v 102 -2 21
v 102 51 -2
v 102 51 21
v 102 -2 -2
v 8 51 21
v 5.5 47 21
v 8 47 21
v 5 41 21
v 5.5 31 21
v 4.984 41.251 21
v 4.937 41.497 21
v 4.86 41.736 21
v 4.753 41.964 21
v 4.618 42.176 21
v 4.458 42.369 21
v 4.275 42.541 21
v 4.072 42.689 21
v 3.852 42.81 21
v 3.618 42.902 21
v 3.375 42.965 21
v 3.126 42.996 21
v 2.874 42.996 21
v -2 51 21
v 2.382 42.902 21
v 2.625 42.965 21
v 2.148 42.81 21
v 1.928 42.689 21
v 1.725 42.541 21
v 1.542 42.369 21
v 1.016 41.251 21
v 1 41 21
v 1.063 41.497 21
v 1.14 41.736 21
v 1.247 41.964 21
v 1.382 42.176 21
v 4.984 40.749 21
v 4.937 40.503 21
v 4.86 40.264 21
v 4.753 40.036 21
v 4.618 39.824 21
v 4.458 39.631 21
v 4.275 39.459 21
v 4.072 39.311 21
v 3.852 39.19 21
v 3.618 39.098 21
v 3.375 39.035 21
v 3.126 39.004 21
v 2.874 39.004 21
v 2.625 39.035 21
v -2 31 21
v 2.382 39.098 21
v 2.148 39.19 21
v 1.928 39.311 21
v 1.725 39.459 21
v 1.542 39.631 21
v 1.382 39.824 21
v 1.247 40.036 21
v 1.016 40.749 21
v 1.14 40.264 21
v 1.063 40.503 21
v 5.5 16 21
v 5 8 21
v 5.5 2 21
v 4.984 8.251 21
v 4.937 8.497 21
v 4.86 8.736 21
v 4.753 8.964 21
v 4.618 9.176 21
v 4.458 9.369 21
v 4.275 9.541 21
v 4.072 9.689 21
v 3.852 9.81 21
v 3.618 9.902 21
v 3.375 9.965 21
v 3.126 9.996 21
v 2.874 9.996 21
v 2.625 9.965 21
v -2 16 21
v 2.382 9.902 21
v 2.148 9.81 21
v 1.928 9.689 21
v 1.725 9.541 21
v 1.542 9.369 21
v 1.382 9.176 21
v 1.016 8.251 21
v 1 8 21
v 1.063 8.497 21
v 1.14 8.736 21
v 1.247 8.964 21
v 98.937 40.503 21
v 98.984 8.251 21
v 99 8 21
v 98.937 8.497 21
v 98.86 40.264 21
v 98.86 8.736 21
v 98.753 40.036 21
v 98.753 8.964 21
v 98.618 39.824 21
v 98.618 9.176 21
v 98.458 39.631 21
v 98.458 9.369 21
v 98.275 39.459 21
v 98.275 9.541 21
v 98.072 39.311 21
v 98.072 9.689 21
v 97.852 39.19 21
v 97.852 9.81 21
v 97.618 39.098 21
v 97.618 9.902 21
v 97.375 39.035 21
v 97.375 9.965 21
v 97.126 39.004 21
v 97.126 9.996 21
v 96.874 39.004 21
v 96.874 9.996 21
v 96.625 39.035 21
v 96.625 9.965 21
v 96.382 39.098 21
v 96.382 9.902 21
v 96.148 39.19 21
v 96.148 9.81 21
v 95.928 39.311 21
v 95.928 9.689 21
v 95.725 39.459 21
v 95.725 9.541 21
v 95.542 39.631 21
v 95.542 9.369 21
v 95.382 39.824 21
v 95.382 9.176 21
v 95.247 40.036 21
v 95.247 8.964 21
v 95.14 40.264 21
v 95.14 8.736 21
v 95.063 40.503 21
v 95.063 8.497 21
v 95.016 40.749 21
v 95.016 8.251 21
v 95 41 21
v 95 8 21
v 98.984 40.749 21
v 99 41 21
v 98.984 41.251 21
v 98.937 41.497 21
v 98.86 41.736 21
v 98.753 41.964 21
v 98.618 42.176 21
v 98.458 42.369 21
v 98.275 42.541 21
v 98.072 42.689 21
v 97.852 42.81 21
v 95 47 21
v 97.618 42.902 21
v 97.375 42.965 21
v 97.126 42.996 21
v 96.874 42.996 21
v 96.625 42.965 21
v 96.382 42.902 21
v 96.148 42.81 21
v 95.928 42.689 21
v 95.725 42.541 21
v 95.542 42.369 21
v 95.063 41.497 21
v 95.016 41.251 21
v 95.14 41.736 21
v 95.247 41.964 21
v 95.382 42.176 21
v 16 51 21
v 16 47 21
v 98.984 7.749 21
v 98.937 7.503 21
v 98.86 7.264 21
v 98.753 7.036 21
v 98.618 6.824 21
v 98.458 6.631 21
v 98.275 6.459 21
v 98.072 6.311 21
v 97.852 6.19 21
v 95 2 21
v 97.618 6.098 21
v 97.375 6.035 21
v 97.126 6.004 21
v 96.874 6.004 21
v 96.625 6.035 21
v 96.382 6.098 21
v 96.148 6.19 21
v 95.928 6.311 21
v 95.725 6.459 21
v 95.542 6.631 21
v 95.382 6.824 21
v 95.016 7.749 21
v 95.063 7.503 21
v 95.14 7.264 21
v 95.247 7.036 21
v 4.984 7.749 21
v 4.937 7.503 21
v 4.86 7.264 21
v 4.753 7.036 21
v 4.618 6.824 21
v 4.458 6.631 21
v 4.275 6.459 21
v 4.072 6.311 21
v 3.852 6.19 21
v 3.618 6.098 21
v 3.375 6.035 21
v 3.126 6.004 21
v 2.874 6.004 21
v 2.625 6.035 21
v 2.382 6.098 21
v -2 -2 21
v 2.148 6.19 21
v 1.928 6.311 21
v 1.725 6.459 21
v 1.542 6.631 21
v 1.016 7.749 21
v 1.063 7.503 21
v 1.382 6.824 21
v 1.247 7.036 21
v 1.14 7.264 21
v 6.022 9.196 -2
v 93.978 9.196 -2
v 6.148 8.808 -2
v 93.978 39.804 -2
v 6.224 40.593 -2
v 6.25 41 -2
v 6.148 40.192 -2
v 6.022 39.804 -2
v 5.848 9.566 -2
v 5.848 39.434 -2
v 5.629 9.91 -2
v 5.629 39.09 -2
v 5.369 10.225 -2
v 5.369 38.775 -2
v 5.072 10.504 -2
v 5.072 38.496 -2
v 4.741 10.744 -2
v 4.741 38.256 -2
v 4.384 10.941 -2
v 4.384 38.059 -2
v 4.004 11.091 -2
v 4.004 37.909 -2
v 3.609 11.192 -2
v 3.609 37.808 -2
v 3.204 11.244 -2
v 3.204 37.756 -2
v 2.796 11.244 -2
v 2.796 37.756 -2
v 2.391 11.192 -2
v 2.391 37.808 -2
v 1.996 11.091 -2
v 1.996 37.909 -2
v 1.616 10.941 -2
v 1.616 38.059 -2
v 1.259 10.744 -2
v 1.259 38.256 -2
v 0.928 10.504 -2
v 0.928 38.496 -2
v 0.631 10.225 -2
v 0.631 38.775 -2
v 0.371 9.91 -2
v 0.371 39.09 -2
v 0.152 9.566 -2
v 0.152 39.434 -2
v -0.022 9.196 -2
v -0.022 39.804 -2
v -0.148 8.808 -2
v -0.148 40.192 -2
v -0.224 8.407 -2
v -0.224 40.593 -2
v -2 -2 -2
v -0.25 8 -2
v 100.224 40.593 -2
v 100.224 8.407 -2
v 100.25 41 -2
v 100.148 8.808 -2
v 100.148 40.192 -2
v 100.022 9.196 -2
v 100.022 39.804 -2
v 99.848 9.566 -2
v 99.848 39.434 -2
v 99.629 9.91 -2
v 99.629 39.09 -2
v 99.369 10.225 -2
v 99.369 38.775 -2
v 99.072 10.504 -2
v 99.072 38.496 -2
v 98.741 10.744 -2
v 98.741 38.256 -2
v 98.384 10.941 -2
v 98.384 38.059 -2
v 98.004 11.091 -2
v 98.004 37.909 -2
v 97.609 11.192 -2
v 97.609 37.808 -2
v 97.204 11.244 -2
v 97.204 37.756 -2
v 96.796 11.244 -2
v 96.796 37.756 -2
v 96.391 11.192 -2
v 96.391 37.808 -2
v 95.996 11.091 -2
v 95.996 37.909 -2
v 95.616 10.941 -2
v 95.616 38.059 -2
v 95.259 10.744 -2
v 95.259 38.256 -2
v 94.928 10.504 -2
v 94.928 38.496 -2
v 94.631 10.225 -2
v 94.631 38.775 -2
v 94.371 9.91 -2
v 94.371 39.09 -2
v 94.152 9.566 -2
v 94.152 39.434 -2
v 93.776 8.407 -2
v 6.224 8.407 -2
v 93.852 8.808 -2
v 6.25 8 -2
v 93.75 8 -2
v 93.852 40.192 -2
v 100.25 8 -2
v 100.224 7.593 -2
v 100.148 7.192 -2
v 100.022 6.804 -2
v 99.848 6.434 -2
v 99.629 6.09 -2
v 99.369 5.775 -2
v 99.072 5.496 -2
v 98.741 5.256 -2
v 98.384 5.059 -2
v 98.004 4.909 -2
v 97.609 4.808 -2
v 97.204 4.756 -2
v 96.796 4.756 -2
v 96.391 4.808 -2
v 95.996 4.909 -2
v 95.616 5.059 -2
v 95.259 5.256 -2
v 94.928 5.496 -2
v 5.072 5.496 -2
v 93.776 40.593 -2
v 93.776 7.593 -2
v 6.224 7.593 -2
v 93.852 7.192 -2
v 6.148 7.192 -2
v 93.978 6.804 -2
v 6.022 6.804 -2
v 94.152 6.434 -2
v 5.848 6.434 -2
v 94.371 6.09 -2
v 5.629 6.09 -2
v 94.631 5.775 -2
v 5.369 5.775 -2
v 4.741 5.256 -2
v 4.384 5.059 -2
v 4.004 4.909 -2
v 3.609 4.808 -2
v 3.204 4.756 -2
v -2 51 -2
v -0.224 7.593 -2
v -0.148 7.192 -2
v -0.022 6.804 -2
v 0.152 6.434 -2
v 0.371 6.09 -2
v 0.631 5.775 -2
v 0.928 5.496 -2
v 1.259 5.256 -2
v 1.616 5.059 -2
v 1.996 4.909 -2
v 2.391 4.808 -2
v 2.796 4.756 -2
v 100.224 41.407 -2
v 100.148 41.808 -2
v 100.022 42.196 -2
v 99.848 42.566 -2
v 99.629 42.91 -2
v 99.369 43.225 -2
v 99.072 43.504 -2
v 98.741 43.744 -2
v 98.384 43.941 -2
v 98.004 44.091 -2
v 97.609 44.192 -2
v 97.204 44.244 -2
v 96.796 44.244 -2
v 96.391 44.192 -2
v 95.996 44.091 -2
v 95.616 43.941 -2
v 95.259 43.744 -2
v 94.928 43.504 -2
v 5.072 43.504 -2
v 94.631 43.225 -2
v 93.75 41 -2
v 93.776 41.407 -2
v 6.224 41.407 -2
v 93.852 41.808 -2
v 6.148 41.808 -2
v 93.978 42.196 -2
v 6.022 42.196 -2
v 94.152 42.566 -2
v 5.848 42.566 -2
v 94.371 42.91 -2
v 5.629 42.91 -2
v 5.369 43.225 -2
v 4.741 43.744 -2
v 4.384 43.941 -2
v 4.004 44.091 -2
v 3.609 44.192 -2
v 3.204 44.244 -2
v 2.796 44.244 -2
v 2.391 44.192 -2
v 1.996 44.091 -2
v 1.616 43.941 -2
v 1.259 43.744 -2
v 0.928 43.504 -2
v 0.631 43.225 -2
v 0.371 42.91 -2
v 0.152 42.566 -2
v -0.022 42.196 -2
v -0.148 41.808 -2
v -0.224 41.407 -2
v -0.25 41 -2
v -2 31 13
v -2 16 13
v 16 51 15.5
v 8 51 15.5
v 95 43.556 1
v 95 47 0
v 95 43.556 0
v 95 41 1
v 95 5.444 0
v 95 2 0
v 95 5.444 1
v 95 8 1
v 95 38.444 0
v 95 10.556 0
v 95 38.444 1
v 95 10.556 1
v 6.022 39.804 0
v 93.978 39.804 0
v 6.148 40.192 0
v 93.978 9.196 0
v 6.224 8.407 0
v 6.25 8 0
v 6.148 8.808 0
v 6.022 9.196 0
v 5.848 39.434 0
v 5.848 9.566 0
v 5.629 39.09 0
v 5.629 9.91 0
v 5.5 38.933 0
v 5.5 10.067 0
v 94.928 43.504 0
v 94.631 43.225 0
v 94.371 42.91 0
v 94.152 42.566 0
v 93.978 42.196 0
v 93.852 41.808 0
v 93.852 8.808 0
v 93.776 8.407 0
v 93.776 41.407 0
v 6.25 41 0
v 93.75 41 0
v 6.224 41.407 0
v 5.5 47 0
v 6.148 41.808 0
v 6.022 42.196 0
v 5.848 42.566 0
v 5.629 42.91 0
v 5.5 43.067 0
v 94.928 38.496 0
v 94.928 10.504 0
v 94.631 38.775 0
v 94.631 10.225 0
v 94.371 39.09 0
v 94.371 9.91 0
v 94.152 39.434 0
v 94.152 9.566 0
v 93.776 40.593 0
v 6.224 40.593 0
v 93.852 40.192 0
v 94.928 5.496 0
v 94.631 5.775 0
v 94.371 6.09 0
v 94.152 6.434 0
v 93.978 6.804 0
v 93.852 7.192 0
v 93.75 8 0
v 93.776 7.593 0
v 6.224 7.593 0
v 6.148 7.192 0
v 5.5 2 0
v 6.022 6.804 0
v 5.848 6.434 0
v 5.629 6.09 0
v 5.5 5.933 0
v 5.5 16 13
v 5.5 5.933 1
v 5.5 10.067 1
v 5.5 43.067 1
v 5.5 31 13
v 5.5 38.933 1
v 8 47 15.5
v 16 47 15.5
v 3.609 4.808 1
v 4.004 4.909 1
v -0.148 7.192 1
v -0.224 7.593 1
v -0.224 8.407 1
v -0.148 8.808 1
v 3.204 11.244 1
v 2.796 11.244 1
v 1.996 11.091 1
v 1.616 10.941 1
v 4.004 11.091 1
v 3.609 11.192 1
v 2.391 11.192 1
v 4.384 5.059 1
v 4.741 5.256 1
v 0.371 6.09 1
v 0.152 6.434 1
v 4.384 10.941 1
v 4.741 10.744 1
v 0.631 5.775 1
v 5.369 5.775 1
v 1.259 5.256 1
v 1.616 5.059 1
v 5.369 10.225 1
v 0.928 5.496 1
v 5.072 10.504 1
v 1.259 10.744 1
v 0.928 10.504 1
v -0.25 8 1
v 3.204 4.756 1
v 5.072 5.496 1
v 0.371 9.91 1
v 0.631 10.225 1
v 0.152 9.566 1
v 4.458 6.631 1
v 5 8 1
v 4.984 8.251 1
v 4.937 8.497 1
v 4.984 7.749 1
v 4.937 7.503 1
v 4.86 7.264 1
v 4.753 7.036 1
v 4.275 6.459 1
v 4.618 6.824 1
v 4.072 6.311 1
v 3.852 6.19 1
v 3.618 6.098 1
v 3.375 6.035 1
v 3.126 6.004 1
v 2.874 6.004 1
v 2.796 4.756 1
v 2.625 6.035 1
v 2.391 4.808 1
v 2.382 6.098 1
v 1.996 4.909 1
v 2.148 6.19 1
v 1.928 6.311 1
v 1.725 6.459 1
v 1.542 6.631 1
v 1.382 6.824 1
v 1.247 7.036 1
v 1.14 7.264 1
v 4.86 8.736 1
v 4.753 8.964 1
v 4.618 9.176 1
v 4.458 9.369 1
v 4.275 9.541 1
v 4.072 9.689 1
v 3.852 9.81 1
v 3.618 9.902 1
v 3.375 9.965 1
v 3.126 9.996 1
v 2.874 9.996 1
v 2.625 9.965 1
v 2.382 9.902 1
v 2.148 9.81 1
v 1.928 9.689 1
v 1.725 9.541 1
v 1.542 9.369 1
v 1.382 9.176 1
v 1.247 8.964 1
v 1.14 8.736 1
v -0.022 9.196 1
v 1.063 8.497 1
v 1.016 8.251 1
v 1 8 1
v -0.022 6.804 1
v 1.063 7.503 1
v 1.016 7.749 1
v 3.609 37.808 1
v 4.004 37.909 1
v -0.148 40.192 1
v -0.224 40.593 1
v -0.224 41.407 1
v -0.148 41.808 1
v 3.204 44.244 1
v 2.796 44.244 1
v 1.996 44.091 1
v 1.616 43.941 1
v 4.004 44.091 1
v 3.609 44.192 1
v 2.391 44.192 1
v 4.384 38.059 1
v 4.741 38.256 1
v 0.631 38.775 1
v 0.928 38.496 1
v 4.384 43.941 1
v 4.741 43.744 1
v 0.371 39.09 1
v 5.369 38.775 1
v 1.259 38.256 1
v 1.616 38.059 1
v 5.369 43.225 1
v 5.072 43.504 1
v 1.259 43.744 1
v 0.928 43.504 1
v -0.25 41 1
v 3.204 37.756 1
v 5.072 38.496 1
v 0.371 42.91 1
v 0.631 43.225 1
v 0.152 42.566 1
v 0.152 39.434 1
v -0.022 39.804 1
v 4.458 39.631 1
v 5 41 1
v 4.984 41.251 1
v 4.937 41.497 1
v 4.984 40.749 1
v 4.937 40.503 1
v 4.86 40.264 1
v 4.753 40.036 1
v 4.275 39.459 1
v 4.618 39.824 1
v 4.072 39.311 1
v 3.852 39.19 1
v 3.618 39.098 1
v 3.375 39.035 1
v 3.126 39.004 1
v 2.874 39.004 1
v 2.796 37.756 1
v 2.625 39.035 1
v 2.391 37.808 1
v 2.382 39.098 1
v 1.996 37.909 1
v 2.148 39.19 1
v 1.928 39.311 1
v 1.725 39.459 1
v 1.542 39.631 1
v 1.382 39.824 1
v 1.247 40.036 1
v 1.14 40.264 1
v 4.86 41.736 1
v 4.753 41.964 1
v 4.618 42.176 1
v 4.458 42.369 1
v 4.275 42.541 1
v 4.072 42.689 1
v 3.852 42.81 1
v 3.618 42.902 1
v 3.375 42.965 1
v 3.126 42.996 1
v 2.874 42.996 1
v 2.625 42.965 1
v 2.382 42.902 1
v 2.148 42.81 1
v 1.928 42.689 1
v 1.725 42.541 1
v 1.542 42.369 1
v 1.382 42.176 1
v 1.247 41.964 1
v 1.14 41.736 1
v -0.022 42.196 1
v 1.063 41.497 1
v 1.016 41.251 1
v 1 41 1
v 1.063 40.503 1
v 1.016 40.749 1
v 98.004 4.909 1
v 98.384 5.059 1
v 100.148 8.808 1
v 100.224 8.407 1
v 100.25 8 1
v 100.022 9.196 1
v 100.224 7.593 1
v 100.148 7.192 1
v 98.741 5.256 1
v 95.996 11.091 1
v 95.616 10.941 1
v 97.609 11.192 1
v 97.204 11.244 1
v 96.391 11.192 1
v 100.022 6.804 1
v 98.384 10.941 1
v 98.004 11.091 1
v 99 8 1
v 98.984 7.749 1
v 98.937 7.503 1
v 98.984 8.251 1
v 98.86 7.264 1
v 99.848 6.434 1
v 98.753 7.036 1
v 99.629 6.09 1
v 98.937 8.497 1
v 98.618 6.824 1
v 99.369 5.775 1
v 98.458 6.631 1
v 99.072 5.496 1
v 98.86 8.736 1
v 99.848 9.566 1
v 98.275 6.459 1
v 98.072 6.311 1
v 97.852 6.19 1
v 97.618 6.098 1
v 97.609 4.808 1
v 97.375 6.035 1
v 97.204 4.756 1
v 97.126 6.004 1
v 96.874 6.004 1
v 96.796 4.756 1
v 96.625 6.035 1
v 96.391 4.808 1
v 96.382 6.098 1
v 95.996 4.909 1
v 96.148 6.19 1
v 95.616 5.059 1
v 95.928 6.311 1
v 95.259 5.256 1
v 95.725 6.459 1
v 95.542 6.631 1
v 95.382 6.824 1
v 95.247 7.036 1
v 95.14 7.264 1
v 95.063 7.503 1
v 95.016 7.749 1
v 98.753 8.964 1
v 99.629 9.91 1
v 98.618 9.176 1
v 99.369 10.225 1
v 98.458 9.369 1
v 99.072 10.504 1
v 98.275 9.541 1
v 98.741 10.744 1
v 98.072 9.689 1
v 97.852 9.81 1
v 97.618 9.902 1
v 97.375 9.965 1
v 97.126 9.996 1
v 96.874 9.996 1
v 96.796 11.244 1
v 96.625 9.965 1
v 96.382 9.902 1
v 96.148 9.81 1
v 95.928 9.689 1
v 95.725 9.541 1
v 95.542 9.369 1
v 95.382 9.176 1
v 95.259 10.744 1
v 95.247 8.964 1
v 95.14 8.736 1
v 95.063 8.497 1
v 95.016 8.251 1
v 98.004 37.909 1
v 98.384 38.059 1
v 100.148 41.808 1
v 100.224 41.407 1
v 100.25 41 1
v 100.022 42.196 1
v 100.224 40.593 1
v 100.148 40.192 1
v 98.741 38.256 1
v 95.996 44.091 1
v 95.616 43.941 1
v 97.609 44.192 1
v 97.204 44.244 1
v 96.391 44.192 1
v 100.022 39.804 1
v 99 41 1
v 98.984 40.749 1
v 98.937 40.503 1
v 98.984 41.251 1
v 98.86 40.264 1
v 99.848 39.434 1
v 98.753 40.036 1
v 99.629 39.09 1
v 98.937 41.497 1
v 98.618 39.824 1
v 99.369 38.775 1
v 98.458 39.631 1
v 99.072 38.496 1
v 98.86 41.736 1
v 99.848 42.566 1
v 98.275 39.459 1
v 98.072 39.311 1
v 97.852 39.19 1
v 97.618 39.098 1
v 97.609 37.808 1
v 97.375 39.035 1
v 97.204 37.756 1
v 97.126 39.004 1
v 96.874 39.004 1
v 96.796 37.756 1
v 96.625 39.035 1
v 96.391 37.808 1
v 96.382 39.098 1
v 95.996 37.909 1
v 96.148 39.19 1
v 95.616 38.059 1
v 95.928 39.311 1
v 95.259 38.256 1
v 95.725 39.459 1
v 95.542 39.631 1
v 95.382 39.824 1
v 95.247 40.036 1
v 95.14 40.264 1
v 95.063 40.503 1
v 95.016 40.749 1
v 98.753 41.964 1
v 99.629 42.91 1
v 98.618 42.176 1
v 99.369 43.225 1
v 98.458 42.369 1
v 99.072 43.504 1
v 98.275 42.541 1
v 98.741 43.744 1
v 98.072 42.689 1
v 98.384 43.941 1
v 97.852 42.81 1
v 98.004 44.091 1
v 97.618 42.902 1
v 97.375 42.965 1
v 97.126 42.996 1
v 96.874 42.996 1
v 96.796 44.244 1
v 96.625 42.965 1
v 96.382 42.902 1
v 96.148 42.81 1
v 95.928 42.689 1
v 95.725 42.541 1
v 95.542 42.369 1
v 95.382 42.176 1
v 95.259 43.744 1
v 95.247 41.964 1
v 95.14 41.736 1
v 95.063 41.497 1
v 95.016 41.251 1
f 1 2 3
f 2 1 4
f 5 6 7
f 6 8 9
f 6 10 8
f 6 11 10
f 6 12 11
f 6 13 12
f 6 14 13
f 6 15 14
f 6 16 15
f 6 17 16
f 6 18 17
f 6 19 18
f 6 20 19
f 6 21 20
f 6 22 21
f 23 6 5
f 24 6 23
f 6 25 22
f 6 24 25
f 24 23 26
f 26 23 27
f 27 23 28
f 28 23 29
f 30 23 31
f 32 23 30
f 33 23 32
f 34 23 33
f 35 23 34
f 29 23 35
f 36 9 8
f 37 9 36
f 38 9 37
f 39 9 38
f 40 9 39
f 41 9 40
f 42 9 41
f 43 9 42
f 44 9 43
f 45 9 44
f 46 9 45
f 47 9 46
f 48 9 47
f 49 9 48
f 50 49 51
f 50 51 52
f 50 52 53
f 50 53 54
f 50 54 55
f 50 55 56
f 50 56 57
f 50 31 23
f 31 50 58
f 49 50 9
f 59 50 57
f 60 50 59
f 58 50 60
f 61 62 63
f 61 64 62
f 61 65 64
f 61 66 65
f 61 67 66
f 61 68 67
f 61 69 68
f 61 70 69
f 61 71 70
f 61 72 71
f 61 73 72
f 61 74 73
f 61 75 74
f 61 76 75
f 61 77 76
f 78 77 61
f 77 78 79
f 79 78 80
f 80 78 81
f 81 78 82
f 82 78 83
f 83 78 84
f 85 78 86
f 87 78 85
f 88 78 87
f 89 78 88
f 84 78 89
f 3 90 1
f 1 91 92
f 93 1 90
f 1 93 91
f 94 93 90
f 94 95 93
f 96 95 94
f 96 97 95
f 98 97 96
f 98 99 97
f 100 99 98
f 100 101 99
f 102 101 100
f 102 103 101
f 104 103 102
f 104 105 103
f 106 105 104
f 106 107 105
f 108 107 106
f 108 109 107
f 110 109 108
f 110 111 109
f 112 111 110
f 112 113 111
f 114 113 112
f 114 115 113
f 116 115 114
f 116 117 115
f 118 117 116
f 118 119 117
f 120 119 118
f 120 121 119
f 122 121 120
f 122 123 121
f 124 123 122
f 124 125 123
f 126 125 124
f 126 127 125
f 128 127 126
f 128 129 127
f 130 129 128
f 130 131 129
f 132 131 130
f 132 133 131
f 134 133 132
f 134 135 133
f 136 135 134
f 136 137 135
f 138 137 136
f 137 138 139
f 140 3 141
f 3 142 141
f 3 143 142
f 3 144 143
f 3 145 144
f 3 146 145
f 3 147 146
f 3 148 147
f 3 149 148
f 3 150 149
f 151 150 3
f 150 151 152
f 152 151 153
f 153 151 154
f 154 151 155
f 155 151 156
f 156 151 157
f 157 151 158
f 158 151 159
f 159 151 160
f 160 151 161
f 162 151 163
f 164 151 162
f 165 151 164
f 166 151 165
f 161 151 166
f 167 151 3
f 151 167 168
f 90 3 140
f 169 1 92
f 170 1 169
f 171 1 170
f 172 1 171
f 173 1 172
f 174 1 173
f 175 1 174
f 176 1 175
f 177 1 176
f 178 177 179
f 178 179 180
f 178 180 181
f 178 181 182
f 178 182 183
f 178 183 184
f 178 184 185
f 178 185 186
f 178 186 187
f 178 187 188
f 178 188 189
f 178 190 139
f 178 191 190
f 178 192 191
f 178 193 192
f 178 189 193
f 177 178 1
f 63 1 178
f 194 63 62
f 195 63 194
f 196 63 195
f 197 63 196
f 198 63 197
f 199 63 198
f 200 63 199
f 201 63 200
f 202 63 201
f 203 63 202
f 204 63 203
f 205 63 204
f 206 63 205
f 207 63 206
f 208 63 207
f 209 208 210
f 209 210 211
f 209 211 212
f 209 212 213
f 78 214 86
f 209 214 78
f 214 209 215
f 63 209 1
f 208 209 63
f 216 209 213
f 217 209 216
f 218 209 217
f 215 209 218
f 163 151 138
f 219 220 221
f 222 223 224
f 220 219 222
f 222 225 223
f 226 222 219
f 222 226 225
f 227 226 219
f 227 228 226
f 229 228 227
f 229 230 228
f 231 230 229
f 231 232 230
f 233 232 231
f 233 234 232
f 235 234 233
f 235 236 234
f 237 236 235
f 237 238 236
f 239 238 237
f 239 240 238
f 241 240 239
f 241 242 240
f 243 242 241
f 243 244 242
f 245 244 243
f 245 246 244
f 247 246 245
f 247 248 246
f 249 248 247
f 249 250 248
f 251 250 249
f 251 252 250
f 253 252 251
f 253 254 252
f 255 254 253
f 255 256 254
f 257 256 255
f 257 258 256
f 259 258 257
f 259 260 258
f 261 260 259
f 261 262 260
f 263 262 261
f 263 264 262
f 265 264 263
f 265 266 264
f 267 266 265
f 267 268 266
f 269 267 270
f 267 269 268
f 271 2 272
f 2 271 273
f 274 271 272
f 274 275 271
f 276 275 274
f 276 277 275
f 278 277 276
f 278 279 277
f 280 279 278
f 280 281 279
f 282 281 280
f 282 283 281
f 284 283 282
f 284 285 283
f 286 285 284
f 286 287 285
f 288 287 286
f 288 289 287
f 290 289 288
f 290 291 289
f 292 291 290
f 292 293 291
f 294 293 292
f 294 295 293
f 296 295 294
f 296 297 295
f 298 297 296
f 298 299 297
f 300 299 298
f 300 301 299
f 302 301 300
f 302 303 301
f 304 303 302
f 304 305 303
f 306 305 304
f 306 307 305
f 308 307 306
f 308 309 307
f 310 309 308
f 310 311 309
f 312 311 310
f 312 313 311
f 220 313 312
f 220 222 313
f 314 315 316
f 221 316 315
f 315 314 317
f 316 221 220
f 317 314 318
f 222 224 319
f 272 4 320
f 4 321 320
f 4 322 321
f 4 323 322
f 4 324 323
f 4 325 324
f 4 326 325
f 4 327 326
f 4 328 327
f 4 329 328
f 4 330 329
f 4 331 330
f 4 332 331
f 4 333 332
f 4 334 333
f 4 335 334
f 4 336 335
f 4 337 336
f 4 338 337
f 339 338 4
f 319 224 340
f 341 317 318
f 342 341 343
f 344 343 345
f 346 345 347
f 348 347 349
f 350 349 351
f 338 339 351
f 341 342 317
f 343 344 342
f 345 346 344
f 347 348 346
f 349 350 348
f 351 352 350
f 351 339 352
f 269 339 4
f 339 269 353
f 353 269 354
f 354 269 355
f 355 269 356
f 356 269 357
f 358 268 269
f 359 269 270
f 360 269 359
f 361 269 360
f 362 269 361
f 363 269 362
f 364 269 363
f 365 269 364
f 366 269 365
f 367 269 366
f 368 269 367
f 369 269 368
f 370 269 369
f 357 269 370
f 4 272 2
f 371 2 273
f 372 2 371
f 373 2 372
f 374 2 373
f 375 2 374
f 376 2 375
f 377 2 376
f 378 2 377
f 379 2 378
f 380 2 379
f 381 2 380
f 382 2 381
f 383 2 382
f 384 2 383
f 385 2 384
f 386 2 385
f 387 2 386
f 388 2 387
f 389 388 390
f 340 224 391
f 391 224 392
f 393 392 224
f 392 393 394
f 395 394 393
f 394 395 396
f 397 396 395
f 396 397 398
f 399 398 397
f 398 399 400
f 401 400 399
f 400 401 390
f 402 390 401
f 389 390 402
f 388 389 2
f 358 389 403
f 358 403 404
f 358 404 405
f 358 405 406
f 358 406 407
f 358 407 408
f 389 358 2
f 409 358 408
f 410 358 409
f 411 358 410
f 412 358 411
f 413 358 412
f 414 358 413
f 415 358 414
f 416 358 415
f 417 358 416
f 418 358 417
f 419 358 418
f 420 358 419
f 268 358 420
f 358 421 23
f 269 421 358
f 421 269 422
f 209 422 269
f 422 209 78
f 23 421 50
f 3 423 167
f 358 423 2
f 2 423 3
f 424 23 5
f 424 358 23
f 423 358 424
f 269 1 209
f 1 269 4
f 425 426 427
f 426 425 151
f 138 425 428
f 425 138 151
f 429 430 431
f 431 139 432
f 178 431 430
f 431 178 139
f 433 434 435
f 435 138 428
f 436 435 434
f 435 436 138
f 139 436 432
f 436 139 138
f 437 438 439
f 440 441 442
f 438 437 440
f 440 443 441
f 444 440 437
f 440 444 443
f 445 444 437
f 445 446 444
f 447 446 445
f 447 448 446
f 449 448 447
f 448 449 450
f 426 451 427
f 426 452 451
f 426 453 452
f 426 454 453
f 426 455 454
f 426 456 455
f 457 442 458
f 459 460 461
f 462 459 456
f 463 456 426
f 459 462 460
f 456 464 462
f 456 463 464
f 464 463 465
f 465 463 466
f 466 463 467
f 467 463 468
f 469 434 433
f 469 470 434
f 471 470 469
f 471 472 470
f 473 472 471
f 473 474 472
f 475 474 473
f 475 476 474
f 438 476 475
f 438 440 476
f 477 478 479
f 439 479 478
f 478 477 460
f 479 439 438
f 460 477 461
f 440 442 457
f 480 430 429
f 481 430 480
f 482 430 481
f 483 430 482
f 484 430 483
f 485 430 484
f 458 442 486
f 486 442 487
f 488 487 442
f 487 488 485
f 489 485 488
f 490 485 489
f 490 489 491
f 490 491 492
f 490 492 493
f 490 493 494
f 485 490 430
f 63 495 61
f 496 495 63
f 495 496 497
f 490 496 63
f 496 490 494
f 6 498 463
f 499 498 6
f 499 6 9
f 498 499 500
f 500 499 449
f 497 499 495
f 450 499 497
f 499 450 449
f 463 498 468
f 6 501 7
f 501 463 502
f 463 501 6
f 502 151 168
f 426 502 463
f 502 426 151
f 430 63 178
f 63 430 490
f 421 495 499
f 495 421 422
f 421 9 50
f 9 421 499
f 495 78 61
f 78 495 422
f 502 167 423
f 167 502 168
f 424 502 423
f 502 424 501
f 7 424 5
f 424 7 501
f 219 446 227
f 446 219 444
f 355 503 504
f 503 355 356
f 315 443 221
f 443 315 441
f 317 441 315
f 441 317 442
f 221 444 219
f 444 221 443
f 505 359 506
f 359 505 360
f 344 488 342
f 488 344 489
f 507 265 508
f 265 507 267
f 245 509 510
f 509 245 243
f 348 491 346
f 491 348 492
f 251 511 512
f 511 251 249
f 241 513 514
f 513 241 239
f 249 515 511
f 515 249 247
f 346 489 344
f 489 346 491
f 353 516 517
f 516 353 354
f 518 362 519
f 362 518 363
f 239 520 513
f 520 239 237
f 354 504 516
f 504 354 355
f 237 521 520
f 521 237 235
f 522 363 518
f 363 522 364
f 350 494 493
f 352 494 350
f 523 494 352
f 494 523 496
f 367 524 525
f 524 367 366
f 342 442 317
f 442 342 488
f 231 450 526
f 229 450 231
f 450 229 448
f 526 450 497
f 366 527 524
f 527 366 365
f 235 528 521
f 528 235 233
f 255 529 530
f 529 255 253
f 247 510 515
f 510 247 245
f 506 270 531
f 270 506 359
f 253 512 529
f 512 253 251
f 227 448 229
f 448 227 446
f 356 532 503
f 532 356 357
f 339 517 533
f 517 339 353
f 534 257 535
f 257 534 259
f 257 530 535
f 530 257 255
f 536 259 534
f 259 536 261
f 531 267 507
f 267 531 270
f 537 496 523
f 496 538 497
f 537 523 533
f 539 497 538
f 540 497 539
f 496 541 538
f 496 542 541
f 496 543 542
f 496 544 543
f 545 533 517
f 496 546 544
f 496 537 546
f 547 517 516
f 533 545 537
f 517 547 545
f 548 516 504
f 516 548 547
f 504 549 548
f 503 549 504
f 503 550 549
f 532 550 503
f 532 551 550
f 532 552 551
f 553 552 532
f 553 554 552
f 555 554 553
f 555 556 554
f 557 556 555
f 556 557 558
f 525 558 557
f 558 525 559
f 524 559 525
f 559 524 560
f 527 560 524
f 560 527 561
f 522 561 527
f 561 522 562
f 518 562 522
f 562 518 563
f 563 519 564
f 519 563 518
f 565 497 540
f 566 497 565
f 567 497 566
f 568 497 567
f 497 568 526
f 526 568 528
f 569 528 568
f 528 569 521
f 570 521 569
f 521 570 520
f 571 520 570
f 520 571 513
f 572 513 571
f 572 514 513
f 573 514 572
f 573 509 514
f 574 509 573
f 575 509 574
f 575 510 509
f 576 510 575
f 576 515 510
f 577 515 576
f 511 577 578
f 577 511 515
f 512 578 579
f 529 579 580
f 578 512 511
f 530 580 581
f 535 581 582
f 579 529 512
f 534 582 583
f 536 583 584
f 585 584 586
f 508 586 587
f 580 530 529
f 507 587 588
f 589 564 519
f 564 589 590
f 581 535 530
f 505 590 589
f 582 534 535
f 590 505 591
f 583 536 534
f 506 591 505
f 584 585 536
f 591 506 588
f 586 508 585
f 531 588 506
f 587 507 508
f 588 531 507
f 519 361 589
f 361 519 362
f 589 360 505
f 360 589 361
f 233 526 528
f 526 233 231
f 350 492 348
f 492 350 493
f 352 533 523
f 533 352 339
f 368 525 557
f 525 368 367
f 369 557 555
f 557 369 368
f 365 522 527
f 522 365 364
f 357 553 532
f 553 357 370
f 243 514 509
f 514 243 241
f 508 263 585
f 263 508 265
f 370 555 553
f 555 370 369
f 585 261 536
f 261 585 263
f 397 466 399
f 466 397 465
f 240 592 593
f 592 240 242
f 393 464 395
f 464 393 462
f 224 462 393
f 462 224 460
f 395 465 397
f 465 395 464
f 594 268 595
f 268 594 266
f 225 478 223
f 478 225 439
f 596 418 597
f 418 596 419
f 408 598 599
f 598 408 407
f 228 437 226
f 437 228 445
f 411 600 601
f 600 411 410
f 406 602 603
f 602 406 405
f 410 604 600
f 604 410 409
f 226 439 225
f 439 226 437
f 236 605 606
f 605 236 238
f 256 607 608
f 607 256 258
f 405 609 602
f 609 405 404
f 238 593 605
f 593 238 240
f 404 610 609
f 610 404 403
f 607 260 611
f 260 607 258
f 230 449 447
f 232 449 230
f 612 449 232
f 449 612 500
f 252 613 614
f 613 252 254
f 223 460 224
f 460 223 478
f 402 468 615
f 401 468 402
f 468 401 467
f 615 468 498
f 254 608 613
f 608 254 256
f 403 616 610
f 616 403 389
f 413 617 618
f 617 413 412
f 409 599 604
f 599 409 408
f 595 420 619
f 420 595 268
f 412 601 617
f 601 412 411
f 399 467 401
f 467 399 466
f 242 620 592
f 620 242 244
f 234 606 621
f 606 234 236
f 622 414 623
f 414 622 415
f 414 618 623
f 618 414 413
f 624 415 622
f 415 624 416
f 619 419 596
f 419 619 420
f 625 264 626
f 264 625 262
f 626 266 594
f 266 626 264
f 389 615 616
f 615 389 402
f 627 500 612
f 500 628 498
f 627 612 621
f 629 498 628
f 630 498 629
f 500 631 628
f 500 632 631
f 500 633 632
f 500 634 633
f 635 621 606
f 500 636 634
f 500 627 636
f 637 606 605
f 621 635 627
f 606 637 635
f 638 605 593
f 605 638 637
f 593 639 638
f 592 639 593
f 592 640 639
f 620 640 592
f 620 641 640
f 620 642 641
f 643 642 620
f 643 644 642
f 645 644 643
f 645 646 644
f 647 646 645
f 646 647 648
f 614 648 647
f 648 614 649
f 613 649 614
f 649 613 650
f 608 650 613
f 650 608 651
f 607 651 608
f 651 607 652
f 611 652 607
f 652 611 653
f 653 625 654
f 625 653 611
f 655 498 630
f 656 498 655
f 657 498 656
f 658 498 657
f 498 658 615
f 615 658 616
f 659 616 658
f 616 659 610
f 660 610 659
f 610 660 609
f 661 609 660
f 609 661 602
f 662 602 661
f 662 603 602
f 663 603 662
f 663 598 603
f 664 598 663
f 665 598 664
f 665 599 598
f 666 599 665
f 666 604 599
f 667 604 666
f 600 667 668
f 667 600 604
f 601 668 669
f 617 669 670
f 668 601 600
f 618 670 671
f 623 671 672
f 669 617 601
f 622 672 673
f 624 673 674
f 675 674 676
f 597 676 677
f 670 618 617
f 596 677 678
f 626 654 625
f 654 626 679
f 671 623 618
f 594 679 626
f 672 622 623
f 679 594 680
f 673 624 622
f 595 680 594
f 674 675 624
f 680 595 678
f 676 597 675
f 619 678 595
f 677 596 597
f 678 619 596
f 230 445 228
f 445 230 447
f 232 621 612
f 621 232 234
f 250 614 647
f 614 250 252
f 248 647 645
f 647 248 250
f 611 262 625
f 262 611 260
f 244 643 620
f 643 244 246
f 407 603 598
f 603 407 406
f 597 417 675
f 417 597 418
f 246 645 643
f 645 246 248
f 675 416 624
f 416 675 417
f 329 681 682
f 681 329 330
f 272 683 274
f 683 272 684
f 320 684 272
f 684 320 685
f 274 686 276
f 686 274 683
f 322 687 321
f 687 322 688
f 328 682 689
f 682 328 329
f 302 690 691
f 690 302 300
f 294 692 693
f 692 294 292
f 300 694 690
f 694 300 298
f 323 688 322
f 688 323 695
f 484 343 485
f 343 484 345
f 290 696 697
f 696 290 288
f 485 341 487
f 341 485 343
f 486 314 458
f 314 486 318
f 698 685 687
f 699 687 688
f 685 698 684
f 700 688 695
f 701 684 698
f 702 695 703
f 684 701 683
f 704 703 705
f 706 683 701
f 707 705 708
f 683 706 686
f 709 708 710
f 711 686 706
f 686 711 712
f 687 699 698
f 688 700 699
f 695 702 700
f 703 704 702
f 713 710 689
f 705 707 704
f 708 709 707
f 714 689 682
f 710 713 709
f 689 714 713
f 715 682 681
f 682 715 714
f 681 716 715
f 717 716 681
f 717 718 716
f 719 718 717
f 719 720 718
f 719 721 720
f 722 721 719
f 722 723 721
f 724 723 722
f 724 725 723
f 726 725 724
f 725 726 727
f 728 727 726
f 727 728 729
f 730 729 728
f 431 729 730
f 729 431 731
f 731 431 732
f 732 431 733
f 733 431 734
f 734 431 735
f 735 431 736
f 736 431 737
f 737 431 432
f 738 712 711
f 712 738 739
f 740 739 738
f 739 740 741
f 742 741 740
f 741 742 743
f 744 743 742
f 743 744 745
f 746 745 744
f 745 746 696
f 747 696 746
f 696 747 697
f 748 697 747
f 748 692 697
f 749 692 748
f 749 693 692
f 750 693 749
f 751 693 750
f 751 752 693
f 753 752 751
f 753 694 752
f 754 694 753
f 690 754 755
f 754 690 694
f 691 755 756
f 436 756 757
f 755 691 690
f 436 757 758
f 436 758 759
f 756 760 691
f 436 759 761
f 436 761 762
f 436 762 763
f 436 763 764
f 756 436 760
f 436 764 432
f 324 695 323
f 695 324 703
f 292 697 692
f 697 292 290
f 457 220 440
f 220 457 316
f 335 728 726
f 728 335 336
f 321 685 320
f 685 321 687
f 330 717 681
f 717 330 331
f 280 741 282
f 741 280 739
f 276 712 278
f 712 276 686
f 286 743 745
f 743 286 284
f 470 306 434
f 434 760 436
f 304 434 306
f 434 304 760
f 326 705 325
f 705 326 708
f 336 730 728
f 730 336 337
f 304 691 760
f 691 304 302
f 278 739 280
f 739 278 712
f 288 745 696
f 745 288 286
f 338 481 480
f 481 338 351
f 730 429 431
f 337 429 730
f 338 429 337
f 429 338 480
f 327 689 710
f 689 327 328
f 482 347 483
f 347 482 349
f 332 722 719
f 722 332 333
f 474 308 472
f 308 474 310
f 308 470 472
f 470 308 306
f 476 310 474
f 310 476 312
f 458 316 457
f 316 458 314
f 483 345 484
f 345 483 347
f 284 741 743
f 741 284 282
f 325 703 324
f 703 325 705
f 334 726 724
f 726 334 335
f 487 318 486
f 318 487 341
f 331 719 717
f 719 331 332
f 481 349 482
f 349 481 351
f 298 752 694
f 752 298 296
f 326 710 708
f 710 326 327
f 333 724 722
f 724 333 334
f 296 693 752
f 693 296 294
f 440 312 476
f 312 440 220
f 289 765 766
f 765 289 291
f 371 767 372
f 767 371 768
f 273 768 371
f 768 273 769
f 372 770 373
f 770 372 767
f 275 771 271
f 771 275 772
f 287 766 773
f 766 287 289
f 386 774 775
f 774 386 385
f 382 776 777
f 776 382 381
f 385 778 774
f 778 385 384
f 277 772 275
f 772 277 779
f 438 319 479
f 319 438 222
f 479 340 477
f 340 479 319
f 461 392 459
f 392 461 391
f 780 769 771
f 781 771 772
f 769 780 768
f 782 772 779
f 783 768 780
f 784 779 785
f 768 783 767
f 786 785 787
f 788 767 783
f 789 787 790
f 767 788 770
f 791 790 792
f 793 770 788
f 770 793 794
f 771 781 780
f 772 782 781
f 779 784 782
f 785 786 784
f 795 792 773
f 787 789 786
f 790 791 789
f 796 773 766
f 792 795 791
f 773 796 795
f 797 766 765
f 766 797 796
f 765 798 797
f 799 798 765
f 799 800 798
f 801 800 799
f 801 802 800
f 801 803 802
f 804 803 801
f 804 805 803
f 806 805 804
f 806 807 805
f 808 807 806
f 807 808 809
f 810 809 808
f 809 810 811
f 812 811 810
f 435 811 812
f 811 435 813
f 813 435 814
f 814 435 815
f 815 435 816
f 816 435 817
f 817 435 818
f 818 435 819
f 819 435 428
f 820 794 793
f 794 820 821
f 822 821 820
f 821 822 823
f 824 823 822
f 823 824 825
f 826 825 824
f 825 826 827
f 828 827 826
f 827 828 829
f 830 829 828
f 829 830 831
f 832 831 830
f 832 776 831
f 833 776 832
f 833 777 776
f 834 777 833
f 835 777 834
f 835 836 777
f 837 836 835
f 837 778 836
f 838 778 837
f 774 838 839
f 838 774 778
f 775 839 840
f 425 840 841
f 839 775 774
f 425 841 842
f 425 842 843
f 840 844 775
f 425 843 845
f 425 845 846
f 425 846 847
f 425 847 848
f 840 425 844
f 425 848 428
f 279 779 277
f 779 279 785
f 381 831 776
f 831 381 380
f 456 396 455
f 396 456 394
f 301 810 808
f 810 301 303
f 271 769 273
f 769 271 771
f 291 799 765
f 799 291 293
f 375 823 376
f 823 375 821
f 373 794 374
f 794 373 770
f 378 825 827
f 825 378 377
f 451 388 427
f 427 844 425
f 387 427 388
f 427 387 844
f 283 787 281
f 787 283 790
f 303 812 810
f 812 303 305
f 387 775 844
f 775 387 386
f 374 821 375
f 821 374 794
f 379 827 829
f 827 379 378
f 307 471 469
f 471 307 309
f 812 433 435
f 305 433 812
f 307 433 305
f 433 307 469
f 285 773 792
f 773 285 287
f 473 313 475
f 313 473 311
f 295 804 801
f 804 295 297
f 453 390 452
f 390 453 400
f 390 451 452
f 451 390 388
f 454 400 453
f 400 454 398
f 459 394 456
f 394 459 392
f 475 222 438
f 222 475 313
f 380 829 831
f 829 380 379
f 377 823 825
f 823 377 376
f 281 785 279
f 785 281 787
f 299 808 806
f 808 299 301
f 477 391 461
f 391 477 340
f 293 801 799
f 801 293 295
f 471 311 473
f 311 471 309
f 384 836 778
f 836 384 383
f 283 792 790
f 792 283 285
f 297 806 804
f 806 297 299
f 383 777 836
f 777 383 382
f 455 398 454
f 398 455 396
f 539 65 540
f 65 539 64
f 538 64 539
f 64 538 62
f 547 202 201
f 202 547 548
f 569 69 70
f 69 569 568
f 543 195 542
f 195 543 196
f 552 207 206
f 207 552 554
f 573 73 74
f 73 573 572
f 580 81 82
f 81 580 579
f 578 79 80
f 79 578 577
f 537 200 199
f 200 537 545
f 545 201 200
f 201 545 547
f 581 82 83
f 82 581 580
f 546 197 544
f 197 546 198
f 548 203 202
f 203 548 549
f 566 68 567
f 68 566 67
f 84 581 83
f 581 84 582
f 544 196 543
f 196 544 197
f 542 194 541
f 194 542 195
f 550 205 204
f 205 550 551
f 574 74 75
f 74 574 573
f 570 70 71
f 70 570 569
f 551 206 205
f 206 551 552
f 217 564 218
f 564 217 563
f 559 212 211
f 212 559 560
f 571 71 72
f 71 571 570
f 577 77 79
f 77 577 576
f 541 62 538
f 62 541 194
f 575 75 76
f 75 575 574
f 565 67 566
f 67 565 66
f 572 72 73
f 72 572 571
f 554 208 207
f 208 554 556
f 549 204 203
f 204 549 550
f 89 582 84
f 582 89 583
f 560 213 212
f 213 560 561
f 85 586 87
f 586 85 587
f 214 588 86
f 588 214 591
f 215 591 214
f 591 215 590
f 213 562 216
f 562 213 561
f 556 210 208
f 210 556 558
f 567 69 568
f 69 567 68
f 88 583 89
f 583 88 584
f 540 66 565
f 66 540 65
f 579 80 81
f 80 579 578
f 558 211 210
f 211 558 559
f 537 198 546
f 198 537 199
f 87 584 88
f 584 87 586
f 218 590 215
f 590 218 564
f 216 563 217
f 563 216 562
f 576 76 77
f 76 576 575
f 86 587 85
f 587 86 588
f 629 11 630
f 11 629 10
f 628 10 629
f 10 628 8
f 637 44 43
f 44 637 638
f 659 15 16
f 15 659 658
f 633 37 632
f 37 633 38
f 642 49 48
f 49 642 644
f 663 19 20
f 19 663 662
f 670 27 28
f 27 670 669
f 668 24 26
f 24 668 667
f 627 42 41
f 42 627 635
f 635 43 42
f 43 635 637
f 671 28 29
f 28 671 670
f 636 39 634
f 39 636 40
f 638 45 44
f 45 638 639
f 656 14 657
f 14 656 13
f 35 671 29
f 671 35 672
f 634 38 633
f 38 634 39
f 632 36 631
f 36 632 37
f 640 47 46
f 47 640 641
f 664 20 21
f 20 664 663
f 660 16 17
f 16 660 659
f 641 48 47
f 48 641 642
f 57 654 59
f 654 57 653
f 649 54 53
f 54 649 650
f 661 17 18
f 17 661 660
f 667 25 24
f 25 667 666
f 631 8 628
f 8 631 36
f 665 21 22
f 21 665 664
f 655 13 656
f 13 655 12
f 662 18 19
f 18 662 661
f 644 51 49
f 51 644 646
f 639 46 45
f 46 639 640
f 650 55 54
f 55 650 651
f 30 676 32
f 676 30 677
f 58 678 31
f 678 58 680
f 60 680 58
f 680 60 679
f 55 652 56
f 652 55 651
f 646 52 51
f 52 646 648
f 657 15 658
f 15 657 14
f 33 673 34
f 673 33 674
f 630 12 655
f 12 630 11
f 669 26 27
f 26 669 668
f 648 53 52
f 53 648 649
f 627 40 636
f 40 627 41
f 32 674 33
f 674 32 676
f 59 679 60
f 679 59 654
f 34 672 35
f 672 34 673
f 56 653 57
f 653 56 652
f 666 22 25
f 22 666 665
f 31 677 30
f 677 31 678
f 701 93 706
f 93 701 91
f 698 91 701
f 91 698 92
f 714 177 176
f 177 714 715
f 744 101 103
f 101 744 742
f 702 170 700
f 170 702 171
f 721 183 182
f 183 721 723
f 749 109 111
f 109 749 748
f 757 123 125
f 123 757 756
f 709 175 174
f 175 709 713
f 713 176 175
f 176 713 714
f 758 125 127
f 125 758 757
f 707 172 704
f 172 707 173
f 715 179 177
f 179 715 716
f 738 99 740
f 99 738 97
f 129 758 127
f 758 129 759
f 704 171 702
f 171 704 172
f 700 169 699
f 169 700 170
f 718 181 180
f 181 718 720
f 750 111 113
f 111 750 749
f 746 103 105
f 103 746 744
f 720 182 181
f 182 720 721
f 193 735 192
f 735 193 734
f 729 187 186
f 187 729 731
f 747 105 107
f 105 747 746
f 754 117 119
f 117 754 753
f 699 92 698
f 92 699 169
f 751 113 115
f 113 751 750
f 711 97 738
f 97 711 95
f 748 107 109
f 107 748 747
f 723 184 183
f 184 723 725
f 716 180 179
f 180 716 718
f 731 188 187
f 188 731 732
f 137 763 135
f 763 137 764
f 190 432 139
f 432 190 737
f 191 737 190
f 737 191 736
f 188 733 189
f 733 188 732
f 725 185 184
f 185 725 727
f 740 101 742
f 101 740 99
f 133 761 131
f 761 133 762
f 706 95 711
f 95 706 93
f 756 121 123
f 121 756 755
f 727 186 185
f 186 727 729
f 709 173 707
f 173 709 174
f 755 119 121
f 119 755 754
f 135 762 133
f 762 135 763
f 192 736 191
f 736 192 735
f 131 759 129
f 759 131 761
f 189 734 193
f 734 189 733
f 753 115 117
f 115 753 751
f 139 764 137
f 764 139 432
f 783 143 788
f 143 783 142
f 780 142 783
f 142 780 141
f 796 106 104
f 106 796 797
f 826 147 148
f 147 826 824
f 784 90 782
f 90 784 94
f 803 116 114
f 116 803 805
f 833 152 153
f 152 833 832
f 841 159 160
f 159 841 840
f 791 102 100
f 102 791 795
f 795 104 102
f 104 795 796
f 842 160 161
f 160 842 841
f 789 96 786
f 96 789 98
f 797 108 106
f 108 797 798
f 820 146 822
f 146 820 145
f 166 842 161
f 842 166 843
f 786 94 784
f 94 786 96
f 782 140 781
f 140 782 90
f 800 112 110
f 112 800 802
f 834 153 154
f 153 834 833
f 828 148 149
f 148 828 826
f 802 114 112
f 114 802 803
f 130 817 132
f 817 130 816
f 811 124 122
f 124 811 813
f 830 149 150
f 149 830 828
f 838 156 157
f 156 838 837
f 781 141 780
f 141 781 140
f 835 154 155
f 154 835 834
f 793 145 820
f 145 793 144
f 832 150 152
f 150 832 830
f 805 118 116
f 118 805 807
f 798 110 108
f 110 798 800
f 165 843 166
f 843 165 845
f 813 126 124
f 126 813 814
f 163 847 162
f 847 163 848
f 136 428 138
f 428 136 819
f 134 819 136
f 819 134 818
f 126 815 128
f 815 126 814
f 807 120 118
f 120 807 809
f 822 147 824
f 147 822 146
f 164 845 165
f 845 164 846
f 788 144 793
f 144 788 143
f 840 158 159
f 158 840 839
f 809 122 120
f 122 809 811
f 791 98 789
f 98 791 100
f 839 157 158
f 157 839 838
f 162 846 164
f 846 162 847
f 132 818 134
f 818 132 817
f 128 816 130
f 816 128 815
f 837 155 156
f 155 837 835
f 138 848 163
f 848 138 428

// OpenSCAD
/*
Topcase for: Wemos Powerbank V3, V8 and V9 Design: 2020

==================================================================================
==================================================================================
Copyright (c) Manuel Strauch (hoschi@anukis.de)
The Regents of the University of California. All rights reserved.

Redistribution and use in source and binary forms, with or without modification, 
are permitted provided that the following conditions are met:
Redistributions of source code must retain the above copyright notice, 
this list of conditions and the following disclaimer.
Redistributions in binary form must reproduce the above copyright notice, 
this list of conditions and the following disclaimer in the documentation 
and/orother materials provided with the distribution.
All advertising materials mentioning features or use of this software 
must display the following acknowledgement: "This product includes 
software developed by the University of California, Berkeley and its contributors."
Neither the name of the University nor the names of its contributors may be used 
to endorse or promote products derived from this software without 
specific prior written permission.
THIS SOFTWARE IS PROVIDED BY THE REGENTS AND CONTRIBUTORS "AS IS" AND 
ANY EXPRESS OR IMPLIED WARRANTIES, INCLUDING, BUT NOT LIMITED TO, 
THE IMPLIED WARRANTIES OF MERCHANTABILITY AND FITNESS FOR A PARTICULAR PURPOSE 
ARE DISCLAIMED. IN NO EVENT SHALL THE REGENTS OR CONTRIBUTORS BE LIABLE FOR 
ANY DIRECT, INDIRECT, INCIDENTAL, SPECIAL, EXEMPLARY, OR CONSEQUENTIAL DAMAGES 
(INCLUDING, BUT NOT LIMITED TO, PROCUREMENT OF SUBSTITUTE GOODS OR SERVICES; 
LOSS OF USE, DATA, OR PROFITS; OR BUSINESS INTERRUPTION) HOWEVER CAUSED AND 
ON ANY THEORY OF LIABILITY, WHETHER IN CONTRACT, STRICT LIABILITY, OR TORT 
(INCLUDING NEGLIGENCE OR OTHERWISE) ARISING IN ANY WAY OUT OF THE USE OF THIS 
SOFTWARE, EVEN IF ADVISED OF THE POSSIBILITY OF SUCH DAMAGE.

================================================================================
================================================================================
*/
// Which one , would you build: v3, v8 or v9
type="v8";

/*
================================================================================
================================================================================
*/


if (type=="v3"){
  //V3
  topcase(length=100,width=30,holelength=2,holewidth=2.5);
}

if (type=="v8"){
  //V8
  topcase(length=100,width=49,holelength=3,holewidth=8);
}

if (type=="v9"){
  //V9
  topcase(length=100,width=97,holelength=3,holewidth=8);
}


module topcase(length,width,holelength,holewidth){
    $fn=50;
    difference() {
        translate([-2,-2,-2]) cube([length+4,width+4,23]);
        translate([5.5,2,0])cube([length-10.5,width-4,26]);

        //V3
        if(width == 30) {
          // USB-Port
          translate([-2,7,13])cube([10,15,8]);
        }
        //V8
        if(width == 49) {
          // USB-Port
          translate([-2,16,13])cube([10,15,8]);
        }
        //V9
        if(width == 97) {
          // USB-Port
          translate([-2,41,13])cube([10,15,8]);
        }
        //Power Button
        translate([8,width-2,15.5])cube([8,5,5.5]);        
        
        //Schraubenlöcher
        translate([holelength,holewidth,-2])cylinder(3,6.5/2,6.5/2);
        translate([holelength,width-holewidth,-2])cylinder(3,6.5/2,6.5/2);
        translate([length-holelength,holewidth,-2])cylinder(3,6.5/2,6.5/2);
        translate([length-holelength,width-holewidth,-2])cylinder(3,6.5/2,6.5/2);

        translate([holelength,holewidth,-2])cylinder(26,4/2,4/2);
        translate([holelength,width-holewidth,-2])cylinder(26,4/2,4/2);
        translate([length-holelength,holewidth,-2])cylinder(26,4/2,4/2);
        translate([length-holelength,width-holewidth,-2])cylinder(26,4/2,4/2);
    }
}
